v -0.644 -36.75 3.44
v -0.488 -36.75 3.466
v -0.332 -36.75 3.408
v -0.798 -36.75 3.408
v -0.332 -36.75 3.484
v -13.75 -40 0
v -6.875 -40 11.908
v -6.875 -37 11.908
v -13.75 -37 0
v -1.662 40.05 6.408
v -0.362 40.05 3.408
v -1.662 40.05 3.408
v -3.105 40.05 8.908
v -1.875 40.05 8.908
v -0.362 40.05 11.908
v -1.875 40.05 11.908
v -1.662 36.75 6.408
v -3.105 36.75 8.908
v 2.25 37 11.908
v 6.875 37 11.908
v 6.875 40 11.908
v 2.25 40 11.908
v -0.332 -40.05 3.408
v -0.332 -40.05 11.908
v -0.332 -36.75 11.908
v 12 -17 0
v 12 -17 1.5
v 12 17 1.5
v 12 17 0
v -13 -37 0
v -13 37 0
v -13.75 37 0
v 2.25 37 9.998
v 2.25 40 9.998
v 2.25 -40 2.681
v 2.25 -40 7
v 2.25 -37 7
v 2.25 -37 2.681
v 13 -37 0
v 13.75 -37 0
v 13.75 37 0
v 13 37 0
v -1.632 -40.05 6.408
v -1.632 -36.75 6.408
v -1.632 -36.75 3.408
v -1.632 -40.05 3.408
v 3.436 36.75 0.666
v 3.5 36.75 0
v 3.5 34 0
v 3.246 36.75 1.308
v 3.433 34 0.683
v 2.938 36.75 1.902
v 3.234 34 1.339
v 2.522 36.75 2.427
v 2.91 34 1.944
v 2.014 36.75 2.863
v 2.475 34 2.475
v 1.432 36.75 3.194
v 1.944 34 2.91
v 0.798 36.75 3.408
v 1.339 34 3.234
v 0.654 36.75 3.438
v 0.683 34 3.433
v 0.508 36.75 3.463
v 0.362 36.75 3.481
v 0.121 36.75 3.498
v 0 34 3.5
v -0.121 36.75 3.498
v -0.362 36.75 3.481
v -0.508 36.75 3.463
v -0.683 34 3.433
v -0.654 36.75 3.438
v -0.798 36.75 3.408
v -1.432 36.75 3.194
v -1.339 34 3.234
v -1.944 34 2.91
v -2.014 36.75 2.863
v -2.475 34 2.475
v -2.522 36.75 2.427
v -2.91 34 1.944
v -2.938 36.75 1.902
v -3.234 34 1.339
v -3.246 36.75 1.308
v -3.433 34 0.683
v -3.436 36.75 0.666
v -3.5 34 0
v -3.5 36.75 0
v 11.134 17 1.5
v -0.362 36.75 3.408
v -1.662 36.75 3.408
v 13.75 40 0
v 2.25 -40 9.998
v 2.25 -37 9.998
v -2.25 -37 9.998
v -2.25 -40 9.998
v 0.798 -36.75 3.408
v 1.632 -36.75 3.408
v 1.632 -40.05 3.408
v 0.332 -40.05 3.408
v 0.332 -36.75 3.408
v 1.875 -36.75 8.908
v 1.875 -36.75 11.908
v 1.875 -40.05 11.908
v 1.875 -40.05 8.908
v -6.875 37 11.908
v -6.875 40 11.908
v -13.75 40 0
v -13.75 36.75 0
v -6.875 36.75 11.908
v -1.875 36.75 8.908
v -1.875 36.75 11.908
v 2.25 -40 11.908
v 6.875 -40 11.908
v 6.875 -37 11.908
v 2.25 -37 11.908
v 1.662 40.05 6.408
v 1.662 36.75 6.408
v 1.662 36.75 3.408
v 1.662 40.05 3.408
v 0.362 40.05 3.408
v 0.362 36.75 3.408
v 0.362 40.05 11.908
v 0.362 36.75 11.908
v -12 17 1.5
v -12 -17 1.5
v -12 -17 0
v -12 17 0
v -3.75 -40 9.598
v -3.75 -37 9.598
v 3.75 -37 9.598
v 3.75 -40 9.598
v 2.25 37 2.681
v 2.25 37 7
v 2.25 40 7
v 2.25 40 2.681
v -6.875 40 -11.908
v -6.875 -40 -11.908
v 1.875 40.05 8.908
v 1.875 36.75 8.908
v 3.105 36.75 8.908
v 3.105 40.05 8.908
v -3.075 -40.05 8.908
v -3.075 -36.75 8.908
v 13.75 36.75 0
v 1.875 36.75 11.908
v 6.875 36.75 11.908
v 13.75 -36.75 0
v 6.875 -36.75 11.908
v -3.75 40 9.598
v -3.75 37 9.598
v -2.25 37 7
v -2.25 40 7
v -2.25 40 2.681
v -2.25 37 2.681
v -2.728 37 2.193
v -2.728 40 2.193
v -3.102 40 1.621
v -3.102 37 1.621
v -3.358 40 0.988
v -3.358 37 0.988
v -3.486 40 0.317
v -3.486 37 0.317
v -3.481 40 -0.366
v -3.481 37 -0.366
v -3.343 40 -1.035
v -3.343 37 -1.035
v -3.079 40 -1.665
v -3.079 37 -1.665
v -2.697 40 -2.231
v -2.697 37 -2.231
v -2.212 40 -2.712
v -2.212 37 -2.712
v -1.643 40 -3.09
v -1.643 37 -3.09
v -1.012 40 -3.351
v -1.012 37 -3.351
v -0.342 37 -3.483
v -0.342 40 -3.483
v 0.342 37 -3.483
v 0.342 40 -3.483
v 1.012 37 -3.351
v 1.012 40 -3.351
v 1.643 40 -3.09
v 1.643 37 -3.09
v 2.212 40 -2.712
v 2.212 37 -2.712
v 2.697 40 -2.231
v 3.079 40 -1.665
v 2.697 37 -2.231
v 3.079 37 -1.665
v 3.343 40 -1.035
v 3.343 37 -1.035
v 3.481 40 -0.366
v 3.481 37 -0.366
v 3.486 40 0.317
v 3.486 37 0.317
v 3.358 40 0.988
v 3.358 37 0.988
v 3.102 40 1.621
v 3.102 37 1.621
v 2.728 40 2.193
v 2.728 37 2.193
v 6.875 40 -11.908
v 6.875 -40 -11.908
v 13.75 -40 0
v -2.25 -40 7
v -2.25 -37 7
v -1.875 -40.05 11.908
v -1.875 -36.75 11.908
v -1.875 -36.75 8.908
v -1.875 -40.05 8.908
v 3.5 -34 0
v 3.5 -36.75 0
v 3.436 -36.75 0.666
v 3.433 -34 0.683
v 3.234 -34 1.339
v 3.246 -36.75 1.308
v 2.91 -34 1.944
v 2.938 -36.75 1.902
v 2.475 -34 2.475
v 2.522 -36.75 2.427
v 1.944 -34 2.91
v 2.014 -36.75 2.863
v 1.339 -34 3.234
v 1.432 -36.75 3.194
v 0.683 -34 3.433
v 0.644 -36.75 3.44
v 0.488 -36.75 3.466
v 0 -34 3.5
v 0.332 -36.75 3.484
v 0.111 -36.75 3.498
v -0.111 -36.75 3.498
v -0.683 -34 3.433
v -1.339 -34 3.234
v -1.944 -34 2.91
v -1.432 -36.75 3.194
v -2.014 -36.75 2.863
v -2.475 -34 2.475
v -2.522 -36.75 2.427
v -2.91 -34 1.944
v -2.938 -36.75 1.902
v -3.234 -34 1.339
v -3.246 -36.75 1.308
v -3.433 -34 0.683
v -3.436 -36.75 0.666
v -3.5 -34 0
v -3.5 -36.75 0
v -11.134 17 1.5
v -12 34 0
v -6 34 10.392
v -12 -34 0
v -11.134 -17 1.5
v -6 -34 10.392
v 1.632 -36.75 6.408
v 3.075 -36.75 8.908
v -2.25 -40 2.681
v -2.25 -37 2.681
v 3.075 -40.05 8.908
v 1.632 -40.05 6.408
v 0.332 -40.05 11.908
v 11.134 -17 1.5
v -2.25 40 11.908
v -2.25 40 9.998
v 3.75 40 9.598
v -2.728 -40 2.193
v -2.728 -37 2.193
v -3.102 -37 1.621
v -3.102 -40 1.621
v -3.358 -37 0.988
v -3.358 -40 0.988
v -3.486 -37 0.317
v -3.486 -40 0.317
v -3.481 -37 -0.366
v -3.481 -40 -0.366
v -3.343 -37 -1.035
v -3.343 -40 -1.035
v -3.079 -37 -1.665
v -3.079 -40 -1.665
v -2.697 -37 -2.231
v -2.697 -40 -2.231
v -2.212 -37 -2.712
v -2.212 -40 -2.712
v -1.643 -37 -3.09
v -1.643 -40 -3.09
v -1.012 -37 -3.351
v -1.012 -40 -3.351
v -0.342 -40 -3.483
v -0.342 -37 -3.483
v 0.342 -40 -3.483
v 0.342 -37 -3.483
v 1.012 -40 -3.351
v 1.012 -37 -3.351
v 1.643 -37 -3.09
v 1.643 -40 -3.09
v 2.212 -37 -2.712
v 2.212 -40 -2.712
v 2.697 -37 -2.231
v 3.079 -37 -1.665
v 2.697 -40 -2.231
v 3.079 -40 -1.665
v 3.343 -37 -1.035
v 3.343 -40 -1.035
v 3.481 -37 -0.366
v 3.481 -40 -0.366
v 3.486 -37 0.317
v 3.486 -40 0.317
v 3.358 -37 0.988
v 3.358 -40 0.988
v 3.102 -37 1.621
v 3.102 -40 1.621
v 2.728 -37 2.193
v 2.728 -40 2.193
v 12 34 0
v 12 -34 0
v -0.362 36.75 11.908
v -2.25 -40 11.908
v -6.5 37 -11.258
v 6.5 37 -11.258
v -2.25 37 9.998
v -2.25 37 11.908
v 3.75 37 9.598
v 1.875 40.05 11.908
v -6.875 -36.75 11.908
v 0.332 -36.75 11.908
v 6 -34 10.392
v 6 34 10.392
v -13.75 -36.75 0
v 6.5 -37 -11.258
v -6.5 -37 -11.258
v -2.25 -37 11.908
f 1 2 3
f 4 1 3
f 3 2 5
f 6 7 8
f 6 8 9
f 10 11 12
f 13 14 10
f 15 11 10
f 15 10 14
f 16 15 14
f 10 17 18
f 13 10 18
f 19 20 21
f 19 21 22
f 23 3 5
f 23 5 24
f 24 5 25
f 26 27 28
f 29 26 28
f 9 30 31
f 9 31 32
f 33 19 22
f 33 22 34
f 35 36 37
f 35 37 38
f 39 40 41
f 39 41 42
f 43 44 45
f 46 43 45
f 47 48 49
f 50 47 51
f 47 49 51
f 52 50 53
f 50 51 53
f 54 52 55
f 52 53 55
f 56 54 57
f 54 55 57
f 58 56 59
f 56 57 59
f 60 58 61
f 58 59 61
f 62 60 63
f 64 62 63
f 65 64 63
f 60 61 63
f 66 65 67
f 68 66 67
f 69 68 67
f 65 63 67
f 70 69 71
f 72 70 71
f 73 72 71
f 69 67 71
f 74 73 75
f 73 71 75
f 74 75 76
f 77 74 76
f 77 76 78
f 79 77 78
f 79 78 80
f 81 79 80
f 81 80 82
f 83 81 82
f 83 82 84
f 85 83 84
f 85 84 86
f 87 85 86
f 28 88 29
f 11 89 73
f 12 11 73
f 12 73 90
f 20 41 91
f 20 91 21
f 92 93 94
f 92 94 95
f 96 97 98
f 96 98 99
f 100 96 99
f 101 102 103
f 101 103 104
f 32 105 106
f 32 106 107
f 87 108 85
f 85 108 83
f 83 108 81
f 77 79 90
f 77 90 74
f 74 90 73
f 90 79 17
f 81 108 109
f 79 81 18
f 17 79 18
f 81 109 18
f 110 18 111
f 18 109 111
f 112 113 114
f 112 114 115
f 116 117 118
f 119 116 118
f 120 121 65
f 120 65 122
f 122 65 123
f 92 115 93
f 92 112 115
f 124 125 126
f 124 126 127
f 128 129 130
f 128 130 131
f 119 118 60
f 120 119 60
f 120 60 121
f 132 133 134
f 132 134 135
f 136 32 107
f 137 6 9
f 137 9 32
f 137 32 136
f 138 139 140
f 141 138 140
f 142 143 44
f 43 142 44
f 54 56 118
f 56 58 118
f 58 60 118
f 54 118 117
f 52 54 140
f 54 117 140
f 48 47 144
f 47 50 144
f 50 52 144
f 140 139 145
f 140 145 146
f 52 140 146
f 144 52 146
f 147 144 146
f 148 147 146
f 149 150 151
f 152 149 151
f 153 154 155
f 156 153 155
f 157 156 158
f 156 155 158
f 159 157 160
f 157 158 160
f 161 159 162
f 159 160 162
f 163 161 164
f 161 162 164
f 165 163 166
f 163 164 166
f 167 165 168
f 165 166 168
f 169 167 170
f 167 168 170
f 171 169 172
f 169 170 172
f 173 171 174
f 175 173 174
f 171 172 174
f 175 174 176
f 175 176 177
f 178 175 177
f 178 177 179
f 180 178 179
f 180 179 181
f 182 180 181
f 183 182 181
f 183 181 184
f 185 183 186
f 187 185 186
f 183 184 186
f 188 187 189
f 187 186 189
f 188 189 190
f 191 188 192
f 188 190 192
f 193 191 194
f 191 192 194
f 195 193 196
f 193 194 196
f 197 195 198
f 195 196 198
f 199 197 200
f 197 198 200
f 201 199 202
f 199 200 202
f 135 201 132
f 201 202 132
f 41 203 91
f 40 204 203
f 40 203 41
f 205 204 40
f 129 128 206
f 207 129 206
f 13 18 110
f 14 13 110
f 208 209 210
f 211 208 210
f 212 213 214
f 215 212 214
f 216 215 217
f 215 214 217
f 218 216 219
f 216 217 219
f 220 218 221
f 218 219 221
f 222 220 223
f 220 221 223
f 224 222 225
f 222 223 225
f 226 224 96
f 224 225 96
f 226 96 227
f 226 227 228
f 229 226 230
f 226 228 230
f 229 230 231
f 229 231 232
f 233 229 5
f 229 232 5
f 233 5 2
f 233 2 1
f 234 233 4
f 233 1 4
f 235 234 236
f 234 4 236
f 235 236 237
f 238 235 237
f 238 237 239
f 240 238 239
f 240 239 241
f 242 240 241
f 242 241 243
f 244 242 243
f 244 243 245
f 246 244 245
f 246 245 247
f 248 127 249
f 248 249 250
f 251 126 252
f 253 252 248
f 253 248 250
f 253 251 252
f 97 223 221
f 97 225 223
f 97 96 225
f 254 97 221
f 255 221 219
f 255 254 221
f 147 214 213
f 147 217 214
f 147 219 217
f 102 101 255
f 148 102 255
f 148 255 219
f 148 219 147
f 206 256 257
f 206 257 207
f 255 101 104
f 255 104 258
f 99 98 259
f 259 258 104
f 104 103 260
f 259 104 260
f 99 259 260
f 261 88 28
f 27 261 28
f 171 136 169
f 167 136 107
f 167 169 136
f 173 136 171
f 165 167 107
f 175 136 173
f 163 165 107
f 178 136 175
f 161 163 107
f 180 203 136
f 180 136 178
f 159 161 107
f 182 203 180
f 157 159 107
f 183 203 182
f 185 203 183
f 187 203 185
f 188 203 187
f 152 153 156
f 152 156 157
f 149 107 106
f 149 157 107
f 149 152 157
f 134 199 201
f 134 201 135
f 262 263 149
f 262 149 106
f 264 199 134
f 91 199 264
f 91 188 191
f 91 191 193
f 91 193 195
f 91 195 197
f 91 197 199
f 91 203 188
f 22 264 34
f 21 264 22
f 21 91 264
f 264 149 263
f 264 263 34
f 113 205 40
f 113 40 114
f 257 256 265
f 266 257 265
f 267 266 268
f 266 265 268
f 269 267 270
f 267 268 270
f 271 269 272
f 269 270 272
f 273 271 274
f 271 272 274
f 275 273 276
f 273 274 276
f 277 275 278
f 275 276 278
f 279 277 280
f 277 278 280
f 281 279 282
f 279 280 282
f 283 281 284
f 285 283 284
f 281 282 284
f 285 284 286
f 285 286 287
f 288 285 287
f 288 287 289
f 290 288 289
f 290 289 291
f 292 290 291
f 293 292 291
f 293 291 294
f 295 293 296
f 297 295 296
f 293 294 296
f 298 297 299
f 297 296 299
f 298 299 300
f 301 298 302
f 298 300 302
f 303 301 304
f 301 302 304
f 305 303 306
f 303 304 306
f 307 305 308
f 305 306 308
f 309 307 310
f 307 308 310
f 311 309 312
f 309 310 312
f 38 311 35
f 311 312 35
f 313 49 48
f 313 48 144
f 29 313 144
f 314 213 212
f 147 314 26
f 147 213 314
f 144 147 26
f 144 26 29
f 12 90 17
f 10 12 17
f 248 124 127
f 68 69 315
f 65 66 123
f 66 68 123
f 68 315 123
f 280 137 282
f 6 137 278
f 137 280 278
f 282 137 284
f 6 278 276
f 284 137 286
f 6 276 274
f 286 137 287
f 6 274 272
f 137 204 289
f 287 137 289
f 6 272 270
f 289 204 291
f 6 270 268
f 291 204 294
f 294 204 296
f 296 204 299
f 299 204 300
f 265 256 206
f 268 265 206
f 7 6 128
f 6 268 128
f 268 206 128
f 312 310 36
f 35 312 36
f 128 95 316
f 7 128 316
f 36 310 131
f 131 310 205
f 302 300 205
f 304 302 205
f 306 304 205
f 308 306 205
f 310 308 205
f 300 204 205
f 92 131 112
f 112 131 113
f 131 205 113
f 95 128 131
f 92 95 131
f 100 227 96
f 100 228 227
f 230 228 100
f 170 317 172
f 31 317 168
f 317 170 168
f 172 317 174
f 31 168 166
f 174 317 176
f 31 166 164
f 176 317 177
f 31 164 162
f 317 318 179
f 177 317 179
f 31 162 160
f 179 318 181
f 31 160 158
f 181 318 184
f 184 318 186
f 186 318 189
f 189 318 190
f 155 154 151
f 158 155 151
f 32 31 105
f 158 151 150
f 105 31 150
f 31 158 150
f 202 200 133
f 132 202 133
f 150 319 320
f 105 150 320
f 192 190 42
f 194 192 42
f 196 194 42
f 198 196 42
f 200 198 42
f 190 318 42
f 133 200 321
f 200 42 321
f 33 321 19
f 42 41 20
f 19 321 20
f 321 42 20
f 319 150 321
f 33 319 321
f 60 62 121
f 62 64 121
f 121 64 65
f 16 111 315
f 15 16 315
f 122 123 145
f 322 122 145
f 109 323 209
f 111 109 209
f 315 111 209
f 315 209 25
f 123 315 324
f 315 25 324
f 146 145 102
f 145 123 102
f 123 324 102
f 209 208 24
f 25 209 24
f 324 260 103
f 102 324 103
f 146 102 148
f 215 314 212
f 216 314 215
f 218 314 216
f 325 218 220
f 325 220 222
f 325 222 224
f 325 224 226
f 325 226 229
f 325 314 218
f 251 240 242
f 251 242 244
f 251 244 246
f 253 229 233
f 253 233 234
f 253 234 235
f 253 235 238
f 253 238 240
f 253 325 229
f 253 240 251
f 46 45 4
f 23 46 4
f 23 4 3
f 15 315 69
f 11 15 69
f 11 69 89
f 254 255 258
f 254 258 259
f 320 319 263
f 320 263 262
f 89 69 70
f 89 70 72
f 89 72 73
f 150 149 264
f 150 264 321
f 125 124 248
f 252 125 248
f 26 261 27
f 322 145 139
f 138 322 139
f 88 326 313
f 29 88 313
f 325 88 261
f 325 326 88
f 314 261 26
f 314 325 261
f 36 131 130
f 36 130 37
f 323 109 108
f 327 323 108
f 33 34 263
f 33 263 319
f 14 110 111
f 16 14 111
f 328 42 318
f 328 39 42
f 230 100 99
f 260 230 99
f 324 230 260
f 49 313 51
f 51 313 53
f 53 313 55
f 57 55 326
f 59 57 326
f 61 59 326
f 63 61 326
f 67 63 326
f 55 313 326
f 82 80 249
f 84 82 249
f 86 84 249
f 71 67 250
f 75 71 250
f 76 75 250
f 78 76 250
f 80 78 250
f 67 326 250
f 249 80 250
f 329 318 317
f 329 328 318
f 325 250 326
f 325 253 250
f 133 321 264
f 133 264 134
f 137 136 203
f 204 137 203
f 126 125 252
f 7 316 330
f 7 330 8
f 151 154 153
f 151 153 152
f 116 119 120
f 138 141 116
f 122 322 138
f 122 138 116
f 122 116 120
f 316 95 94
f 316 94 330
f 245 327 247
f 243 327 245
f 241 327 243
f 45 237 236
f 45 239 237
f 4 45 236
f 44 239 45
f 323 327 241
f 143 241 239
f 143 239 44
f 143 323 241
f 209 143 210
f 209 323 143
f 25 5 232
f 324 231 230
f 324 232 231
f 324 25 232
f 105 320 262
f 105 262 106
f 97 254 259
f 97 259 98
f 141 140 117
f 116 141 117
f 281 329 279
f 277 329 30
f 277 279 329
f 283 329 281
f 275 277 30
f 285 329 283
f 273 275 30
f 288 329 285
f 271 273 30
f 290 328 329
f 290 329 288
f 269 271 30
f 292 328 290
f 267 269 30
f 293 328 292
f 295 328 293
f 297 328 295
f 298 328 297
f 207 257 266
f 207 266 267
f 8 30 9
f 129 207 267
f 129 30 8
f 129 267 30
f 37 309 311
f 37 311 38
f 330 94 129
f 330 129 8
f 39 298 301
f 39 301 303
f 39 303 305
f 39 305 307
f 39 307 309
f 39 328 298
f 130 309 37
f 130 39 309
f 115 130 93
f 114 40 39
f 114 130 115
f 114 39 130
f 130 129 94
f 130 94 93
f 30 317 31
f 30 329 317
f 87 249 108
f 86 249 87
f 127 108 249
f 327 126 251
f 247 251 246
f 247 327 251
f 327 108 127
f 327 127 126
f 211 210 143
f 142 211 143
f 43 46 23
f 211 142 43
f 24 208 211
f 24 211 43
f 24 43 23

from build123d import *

# Parameters (mm, degrees)
SKETCH011_W  = 24
SKETCH011_H  = 34
PAD010_DEPTH = 1.5
PAD002_DEPTH = 57.5
PAD001_DEPTH = 37
PAD_DEPTH    = 40
SKETCH009_W  = 3
SKETCH009_H  = 0.4
PAD008_DEPTH = 5
SKETCH010_W  = 3
SKETCH010_H  = 0.4
PAD009_DEPTH = 5
SKETCH005_W  = 62
SKETCH005_H  = 32
PAD005_DEPTH = 47.5
PAD004_DEPTH = 34
PAD003_DEPTH = 36.75
SKETCH006_R  = 3.5
POCKET_DEPTH = 73.501
PAD006_DEPTH = 3.3
PAD007_DEPTH = 3.3


with BuildPart() as mote_fake:
    # Sketch011 → Pad010 (new body, symmetric)
    with BuildSketch(Plane.XY):
        Rectangle(SKETCH011_W, SKETCH011_H)
    extrude(amount=PAD010_DEPTH, both=True)


with BuildPart() as pad002:
    # Sketch002 → Pad002 (new body, symmetric)
    with BuildSketch(Plane.XZ):
        with BuildLine():
            Line((2.25, 7), (2.25, 2.680951))
            ThreePointArc((-2.25, 2.680951), (0, -3.5), (2.25, 2.680951))
            Line((-2.25, 2.680951), (-2.25, 7))
            Line((-3.75, 9.598076), (-2.25, 7))
            Line((-2.25, 9.598076), (-3.75, 9.598076))
            Line((-2.25, 9.598076), (-2.25, 24.598076))
            Line((-2.25, 24.598076), (2.25, 24.598076))
            Line((2.25, 24.598076), (2.25, 9.598076))
            Line((2.25, 9.598076), (3.75, 9.598076))
            Line((3.75, 9.598076), (2.25, 7))
        make_face()
    extrude(amount=PAD002_DEPTH, both=True)


with BuildPart() as pad001:
    # Sketch001 → Pad001 (new body, symmetric)
    with BuildSketch(Plane.XZ):
        Polygon((-19.8481, 20), (19.8481, 20), (19.8481, 0), (13, 0), (6.5, -11.25833), (-6.5, -11.25833), (-13, 0), (-19.8481, 0), align=None)
    extrude(amount=PAD001_DEPTH, both=True)


with BuildPart() as cut004:
    # Sketch → Pad (new body, symmetric)
    with BuildSketch(Plane.XZ):
        Polygon((6.875, -11.907849), (13.75, 0), (6.875, 11.907849), (-6.875, 11.907849), (-13.75, 0), (-6.875, -11.907849), align=None)
    extrude(amount=PAD_DEPTH, both=True)

    # Cut: cut Pad001
    add(pad001.part, mode=Mode.SUBTRACT)

    # Cut001: cut Pad002
    add(pad002.part, mode=Mode.SUBTRACT)

    # Sketch009 → Pad008 (new body)
    with BuildSketch(Plane(origin=(2.25, 0, 0), x_dir=(0, -1, 0), z_dir=(-1, 0, 0))):
        with Locations((-38.5, 9.798076)):
            Rectangle(SKETCH009_W, SKETCH009_H)
    extrude(amount=PAD008_DEPTH)

    # Sketch010 → Pad009 (new body)
    with BuildSketch(Plane(origin=(2.25, 0, 0), x_dir=(0, -1, 0), z_dir=(-1, 0, 0))):
        with Locations((38.5, 9.798076)):
            Rectangle(SKETCH010_W, SKETCH010_H)
    extrude(amount=PAD009_DEPTH)

    # Cut004: cut mote_fake
    add(mote_fake.part, mode=Mode.SUBTRACT)


with BuildPart() as clone_of_mote_fake:
    # Clone base: copy of mote_fake
    add(mote_fake.part)


with BuildPart() as pad005:
    # Sketch005 → Pad005 (new body, symmetric)
    with BuildSketch(Plane.XZ):
        with Locations((0, -16)):
            Rectangle(SKETCH005_W, SKETCH005_H)
    extrude(amount=PAD005_DEPTH, both=True)


with BuildPart() as pad004:
    # Sketch004 → Pad004 (new body, symmetric)
    with BuildSketch(Plane.XZ):
        Polygon((-31.5, 0), (-12, 0), (-6, 10.392305), (6, 10.392305), (12, 0), (31.5, 0), (31.5, -32), (-31.5, -32), align=None)
    extrude(amount=PAD004_DEPTH, both=True)


with BuildPart() as cut005:
    # Sketch003 → Pad003 (new body, symmetric)
    with BuildSketch(Plane.XZ):
        Polygon((6.875, -11.907849), (13.75, 0), (6.875, 11.907849), (-6.875, 11.907849), (-13.75, 0), (-6.875, -11.907849), align=None)
    extrude(amount=PAD003_DEPTH, both=True)

    # Cut002: cut Pad004
    add(pad004.part, mode=Mode.SUBTRACT)

    # Cut003: cut Pad005
    add(pad005.part, mode=Mode.SUBTRACT)

    # Sketch006 → Pocket (cut, through all)
    with BuildSketch(Plane.XZ.offset(36.75)):
        Circle(SKETCH006_R)
    extrude(amount=-POCKET_DEPTH, mode=Mode.SUBTRACT)

    # Sketch007 → Pad006 (new body)
    with BuildSketch(Plane.XZ.offset(36.75)):
        Polygon((-1.875, 11.907849), (-1.875, 8.907849), (-3.075, 8.907849), (-1.631624, 6.407849), (-1.631624, 3.407849), (-0.331624, 3.407849), (-0.331624, 11.907849), align=None)
        Polygon((1.875, 11.907849), (1.875, 8.907849), (3.075, 8.907849), (1.631624, 6.407849), (1.631624, 3.407849), (0.331624, 3.407849), (0.331624, 11.907849), align=None)
    extrude(amount=PAD006_DEPTH)

    # Sketch008 → Pad007 (new body)
    with BuildSketch(Plane(origin=(0, 36.75, 0), x_dir=(-1, 0, 0), z_dir=(0, 1, 0))):
        Polygon((-1.875, 11.907849), (-1.875, 8.907849), (-3.105, 8.907849), (-1.661624, 6.407849), (-1.661624, 3.407849), (-0.361624, 3.407849), (-0.361624, 11.907849), align=None)
        Polygon((0.361624, 11.907849), (0.361624, 3.407849), (1.661624, 3.407849), (1.661624, 6.407849), (3.105, 8.907849), (1.875, 8.907849), (1.875, 11.907849), align=None)
    extrude(amount=PAD007_DEPTH)

    # Cut005: cut Clone of mote_fake
    add(clone_of_mote_fake.part, mode=Mode.SUBTRACT)


solid = Compound([cut004.part, cut005.part])
